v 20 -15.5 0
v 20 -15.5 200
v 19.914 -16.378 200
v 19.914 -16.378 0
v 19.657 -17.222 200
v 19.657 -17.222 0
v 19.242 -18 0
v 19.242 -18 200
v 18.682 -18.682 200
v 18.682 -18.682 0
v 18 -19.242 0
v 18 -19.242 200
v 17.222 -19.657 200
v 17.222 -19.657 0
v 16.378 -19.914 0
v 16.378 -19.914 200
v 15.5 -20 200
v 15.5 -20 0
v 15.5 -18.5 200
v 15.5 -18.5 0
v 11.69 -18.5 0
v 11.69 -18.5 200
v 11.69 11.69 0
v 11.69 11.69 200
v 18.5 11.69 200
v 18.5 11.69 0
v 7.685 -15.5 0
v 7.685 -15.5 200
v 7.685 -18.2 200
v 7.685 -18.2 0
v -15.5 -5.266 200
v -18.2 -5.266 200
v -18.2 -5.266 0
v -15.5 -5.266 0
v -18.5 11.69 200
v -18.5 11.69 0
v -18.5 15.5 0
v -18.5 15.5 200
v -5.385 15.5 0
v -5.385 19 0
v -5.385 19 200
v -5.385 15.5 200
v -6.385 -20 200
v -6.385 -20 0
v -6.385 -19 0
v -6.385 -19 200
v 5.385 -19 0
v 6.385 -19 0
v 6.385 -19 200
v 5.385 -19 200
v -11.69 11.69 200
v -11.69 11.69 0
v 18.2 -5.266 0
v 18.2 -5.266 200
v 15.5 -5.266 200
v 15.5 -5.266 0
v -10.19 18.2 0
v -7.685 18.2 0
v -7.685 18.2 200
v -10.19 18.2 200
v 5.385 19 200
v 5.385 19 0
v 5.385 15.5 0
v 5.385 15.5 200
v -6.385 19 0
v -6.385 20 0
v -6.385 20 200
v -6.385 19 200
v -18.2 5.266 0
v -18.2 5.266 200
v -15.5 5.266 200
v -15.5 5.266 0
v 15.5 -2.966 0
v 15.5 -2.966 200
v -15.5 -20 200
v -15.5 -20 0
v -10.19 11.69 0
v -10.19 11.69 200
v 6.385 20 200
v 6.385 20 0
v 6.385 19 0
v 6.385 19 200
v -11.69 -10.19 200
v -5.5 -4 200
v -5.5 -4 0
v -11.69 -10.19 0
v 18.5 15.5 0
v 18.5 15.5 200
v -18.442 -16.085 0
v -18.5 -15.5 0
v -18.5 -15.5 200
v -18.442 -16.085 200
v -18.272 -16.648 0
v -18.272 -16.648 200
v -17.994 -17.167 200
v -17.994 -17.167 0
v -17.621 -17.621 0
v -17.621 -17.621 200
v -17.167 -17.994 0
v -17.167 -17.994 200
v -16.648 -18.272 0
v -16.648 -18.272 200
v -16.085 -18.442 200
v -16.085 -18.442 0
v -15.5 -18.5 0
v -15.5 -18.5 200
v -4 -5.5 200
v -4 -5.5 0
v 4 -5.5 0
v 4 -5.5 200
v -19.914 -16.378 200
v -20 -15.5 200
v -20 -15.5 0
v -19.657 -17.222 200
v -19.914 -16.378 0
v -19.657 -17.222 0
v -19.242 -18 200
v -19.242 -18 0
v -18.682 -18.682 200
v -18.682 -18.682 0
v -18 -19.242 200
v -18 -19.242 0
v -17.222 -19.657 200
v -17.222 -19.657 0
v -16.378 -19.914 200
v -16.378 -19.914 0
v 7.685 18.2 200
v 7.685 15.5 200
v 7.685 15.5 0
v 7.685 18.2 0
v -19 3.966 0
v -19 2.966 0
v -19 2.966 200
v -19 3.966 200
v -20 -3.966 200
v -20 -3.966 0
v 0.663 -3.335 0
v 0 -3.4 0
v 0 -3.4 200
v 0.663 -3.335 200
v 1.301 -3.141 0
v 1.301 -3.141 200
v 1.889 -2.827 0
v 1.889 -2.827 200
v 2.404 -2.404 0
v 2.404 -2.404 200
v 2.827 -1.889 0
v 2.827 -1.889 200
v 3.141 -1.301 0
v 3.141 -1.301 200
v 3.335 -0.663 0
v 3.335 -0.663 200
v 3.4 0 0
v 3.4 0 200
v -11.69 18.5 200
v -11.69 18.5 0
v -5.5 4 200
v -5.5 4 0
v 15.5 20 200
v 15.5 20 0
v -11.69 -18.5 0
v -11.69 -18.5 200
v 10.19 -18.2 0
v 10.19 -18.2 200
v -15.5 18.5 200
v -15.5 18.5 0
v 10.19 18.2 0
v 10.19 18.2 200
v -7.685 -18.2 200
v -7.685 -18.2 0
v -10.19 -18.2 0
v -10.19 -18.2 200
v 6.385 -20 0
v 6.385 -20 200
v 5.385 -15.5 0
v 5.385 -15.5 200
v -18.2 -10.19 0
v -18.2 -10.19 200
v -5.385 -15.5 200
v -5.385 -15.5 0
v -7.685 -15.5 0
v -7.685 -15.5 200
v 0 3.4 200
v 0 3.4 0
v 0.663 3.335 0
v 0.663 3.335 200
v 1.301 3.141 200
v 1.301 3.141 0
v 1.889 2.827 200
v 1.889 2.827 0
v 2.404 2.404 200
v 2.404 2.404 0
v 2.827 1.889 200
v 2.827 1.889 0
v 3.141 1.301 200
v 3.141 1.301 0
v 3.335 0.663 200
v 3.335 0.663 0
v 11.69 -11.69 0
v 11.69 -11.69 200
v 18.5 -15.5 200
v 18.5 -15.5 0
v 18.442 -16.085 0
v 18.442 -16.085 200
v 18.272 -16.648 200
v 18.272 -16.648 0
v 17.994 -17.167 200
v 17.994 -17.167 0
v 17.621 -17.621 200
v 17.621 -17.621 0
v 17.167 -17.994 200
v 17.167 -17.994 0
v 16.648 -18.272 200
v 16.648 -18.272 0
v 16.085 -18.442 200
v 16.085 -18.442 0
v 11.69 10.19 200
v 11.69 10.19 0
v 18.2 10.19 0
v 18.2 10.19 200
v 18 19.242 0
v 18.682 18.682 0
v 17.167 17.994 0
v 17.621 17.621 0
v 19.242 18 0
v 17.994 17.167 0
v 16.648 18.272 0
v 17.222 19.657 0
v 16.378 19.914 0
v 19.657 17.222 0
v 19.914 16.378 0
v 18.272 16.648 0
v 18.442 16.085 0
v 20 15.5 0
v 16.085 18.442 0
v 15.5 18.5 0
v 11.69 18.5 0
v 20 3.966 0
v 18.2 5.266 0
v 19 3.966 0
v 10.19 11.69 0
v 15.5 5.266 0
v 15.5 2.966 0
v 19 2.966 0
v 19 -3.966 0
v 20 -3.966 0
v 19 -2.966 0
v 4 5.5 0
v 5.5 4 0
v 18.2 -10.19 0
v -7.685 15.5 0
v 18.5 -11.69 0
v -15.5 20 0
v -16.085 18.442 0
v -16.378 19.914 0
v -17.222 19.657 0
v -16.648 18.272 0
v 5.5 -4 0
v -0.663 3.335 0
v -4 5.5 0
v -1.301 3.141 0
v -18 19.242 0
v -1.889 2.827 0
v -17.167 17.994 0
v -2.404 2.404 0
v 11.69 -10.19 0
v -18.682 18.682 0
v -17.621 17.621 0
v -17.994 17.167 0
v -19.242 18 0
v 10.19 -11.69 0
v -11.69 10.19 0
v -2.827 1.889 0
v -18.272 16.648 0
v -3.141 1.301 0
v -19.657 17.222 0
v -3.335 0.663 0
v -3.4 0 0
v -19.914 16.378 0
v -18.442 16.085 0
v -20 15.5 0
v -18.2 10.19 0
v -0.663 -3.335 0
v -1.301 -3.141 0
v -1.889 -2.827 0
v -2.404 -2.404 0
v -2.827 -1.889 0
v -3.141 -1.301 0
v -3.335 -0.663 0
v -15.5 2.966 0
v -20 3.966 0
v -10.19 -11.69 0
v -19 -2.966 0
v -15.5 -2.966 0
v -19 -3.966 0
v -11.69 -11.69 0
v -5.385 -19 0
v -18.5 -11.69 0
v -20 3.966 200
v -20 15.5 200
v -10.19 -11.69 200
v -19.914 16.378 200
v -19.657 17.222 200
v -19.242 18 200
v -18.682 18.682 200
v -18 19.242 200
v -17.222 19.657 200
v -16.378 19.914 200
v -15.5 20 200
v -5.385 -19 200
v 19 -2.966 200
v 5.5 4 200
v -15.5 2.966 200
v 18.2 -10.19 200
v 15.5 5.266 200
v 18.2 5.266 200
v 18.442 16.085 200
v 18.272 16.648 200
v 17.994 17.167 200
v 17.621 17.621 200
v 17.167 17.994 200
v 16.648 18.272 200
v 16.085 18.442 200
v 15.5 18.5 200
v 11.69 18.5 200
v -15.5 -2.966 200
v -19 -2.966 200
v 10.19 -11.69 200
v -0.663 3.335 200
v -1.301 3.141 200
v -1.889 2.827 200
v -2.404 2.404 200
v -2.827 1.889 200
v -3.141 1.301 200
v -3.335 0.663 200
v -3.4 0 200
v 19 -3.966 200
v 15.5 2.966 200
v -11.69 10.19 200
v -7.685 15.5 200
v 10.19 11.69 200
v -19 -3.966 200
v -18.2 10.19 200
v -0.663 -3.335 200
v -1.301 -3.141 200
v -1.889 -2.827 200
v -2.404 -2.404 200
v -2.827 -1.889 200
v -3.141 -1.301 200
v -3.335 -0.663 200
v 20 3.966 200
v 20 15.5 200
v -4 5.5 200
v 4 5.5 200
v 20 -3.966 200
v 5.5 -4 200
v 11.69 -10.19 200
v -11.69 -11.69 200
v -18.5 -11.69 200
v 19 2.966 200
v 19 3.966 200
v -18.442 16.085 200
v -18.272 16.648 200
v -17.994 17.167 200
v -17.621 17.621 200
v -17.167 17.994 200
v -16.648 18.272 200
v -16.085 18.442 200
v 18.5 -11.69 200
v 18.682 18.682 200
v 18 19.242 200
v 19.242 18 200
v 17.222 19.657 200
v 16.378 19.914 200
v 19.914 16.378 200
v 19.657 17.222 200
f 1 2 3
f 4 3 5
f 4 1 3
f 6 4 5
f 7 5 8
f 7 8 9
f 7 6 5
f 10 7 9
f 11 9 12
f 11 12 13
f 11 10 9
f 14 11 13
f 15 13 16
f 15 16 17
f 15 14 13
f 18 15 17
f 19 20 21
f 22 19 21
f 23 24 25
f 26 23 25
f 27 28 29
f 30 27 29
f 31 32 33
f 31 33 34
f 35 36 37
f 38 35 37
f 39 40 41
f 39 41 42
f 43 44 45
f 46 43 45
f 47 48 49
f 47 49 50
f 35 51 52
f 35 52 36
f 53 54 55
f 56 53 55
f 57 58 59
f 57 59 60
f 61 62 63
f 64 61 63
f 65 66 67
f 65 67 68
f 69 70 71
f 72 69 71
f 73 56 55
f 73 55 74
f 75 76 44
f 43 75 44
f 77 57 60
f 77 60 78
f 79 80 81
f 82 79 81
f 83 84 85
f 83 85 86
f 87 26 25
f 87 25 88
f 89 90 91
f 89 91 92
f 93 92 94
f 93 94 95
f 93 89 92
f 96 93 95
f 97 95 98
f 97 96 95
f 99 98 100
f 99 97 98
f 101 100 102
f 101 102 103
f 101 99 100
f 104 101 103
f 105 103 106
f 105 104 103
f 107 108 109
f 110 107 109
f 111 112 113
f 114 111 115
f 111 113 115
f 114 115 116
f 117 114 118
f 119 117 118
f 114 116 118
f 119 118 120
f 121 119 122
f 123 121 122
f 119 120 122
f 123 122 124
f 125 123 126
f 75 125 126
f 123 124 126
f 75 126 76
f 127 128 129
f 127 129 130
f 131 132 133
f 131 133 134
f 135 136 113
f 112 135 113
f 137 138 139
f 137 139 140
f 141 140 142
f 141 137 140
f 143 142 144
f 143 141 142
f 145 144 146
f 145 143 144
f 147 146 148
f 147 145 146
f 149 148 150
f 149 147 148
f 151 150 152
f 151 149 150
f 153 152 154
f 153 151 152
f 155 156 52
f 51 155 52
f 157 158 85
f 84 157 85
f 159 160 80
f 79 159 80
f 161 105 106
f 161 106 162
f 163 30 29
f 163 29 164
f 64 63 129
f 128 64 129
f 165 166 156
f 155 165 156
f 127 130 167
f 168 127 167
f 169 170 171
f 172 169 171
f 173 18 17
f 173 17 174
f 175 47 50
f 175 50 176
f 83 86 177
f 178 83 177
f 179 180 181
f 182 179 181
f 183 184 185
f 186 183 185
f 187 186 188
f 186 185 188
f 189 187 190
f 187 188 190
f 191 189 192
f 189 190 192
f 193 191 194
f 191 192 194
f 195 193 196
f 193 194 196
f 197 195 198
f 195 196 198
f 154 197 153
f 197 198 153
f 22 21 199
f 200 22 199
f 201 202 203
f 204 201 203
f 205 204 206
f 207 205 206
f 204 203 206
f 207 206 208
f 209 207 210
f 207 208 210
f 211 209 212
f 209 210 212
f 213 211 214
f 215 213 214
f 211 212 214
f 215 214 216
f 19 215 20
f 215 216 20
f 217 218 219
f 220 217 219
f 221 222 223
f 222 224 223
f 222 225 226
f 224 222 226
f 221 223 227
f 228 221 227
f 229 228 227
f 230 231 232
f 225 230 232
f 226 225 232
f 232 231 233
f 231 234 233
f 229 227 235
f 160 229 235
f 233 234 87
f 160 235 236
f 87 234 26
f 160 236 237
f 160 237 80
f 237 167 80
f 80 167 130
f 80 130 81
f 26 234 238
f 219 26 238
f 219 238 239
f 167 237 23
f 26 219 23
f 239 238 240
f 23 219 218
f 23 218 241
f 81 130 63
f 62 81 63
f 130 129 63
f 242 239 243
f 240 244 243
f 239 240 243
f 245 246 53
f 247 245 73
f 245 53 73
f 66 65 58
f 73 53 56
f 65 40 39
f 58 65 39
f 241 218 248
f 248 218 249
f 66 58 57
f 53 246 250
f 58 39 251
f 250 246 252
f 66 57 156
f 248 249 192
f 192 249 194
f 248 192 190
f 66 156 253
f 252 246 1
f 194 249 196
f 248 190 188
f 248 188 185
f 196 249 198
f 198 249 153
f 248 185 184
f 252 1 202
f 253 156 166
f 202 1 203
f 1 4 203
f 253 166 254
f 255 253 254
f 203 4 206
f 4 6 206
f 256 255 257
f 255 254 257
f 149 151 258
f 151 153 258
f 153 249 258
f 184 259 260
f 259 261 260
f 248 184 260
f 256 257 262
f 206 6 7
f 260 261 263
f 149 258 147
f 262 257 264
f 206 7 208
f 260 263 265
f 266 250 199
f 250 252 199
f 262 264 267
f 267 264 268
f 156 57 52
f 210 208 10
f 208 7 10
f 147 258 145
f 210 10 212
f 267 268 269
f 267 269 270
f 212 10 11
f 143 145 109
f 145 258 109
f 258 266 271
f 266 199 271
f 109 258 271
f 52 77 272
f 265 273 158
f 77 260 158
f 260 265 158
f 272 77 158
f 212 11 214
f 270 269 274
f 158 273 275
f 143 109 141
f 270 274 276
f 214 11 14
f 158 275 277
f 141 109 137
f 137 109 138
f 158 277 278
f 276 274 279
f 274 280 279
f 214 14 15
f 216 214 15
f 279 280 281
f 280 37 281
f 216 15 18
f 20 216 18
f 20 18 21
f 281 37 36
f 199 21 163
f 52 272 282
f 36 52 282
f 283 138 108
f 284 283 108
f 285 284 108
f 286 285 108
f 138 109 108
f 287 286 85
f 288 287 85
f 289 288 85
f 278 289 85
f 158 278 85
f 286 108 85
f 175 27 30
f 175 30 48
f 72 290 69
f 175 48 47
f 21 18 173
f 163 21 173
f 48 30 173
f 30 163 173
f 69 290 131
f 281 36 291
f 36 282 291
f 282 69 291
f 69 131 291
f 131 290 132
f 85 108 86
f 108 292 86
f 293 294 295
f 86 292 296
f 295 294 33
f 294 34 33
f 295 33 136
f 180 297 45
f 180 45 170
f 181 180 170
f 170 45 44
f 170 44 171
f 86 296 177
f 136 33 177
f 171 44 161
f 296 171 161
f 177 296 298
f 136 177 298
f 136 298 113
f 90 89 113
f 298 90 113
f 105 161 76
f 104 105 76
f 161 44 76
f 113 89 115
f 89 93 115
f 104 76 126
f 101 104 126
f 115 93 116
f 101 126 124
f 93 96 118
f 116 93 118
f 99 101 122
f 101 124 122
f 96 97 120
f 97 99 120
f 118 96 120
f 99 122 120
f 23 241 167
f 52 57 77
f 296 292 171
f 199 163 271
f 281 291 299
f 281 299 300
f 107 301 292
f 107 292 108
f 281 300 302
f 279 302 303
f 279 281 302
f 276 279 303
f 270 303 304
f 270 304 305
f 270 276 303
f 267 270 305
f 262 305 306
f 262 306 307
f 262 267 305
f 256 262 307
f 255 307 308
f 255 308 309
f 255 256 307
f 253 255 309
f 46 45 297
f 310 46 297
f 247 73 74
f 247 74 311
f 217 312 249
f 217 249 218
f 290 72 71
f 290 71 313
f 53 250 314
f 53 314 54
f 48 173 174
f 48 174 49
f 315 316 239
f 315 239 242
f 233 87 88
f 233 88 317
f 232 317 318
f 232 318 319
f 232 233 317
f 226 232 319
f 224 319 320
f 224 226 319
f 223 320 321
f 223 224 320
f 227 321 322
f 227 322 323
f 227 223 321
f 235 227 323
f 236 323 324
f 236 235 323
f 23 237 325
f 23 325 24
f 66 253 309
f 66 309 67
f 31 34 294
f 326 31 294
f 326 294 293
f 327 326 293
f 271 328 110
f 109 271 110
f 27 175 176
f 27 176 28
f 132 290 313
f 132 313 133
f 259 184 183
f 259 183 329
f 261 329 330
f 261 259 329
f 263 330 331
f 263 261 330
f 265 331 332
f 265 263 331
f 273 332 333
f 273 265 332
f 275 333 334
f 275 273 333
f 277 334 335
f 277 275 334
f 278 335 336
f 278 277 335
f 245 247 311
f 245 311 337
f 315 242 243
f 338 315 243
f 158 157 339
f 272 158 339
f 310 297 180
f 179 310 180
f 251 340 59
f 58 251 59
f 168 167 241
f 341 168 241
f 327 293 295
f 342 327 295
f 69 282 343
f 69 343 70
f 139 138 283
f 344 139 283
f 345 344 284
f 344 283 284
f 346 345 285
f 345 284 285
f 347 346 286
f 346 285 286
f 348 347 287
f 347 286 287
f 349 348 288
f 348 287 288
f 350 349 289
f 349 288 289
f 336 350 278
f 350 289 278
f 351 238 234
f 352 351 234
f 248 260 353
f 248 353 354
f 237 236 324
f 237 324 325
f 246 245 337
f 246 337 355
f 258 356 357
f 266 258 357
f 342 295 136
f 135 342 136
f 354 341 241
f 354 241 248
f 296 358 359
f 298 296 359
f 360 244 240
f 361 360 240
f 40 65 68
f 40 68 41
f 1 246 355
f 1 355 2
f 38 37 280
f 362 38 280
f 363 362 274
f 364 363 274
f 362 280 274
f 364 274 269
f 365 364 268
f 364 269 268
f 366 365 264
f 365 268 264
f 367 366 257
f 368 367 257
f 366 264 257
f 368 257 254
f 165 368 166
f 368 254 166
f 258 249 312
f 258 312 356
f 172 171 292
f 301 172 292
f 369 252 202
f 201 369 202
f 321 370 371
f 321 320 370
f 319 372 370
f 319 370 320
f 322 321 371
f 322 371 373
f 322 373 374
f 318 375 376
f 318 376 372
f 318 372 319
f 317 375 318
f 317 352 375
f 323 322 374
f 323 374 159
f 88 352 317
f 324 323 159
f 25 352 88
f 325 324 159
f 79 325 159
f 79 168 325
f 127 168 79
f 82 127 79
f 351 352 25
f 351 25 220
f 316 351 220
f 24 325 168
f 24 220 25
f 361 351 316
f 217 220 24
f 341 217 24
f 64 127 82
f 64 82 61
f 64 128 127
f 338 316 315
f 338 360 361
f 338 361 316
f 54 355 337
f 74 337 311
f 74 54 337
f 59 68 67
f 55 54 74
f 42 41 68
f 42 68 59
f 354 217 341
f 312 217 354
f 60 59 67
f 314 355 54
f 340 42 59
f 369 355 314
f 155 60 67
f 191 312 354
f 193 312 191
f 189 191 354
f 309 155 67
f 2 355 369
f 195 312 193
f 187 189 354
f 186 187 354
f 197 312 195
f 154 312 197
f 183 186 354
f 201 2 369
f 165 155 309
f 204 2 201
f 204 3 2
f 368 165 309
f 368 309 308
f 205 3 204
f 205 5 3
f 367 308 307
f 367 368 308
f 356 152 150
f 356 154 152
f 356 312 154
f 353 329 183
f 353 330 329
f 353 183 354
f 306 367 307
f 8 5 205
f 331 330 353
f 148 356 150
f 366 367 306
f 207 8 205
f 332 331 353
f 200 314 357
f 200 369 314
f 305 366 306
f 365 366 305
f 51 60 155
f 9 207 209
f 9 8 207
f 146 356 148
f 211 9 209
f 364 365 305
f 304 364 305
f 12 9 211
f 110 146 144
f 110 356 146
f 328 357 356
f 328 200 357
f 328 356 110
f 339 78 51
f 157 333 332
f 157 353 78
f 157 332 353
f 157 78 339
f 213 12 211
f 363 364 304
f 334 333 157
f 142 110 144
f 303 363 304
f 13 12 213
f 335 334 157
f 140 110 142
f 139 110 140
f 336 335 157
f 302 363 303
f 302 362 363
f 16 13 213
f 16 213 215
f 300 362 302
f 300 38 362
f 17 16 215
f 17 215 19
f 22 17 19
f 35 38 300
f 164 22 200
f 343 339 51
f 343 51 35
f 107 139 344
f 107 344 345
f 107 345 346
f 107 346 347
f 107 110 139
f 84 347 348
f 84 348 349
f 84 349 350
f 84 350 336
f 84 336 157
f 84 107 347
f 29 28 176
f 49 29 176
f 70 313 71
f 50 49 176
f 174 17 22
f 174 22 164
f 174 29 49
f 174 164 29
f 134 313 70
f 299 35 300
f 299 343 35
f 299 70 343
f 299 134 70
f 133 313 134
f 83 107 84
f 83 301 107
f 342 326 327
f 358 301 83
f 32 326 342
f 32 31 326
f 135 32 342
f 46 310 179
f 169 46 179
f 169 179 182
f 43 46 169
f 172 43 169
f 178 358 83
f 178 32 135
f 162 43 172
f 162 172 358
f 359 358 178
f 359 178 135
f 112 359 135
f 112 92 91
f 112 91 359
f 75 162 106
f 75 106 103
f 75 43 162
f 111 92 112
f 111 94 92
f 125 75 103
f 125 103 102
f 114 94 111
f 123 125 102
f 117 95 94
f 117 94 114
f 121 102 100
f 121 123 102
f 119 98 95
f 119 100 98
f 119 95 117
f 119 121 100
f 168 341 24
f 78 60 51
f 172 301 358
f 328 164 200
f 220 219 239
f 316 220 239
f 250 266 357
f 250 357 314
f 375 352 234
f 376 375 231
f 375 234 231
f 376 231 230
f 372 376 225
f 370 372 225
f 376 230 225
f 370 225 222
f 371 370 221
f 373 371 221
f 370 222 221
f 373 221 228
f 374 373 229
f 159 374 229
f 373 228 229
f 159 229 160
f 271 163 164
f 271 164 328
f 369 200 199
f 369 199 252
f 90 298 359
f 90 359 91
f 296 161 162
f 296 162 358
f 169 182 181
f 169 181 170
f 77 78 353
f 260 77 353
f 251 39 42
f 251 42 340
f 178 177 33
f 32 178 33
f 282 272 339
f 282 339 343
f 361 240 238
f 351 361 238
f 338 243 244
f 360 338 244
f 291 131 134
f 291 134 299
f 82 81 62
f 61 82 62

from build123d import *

# Parameters (mm, degrees)
BOSS_EXTRUDE1_DEPTH  = 200
MIRROR3_COPY_1_DEPTH = 200
MIRROR3_COPY_2_DEPTH = 200


with BuildPart() as part:
    # Sketch1 → Boss-Extrude1 (new body)
    with BuildSketch(Plane.XY):
        with BuildLine():
            Line((3.4, 0), (5.5, 0))
            Line((5.5, 0), (5.5, 4))
            Line((5.5, 4), (11.69, 10.19))
            Line((11.69, 10.19), (18.2, 10.19))
            Line((18.2, 10.19), (18.2, 5.265595036))
            Line((18.2, 5.265595036), (15.5, 5.265595036))
            Line((15.5, 5.265595036), (15.5, 2.965595036))
            Line((15.5, 2.965595036), (19, 2.965595036))
            Line((19, 2.965595036), (19, 3.965595036))
            Line((19, 3.965595036), (20, 3.965595036))
            Line((20, 3.965595036), (20, 15.5))
            ThreePointArc((20, 15.5), (18.681980515, 18.681980515), (15.5, 20))
            Line((15.5, 20), (6.385304712, 20))
            Line((6.385304712, 20), (6.385304712, 19))
            Line((6.385304712, 19), (5.385304712, 19))
            Line((5.385304712, 19), (5.385304712, 15.5))
            Line((5.385304712, 15.5), (7.685304712, 15.5))
            Line((7.685304712, 15.5), (7.685304712, 18.2))
            Line((7.685304712, 18.2), (10.19, 18.2))
            Line((10.19, 18.2), (10.19, 11.69))
            Line((10.19, 11.69), (4, 5.5))
            Line((4, 5.5), (0, 5.5))
            Line((0, 5.5), (0, 3.4))
            ThreePointArc((0, 3.4), (2.404163056, 2.404163056), (3.4, 0))
        make_face()
        with BuildLine():
            Line((18.5, 11.69), (18.5, 15.5))
            ThreePointArc((18.5, 15.5), (17.621320344, 17.621320344), (15.5, 18.5))
            Line((15.5, 18.5), (11.69, 18.5))
            Line((11.69, 18.5), (11.69, 11.69))
            Line((11.69, 11.69), (18.5, 11.69))
        make_face(mode=Mode.SUBTRACT)
    boss_extrude1 = extrude(amount=BOSS_EXTRUDE1_DEPTH)

    # Mirror1: Boss-Extrude1 across plane
    add(boss_extrude1.mirror(Plane.ZX))

    # Mirror2: Boss-Extrude1 across plane
    add(boss_extrude1.mirror(Plane(origin=(0, 0, 0), x_dir=(0, 0, 1), z_dir=(1, 0, 0))))

    # Mirror3 copy 1 sketch → Mirror3 copy 1 (add)
    with BuildSketch(Plane(origin=(0, 0, 0), x_dir=(-1, 0, 0), z_dir=(0, 0, 1))):
        with BuildLine():
            Line((3.4, 0), (5.5, 0))
            Line((5.5, 0), (5.5, 4))
            Line((5.5, 4), (11.69, 10.19))
            Line((11.69, 10.19), (18.2, 10.19))
            Line((18.2, 10.19), (18.2, 5.265595036))
            Line((18.2, 5.265595036), (15.5, 5.265595036))
            Line((15.5, 5.265595036), (15.5, 2.965595036))
            Line((15.5, 2.965595036), (19, 2.965595036))
            Line((19, 2.965595036), (19, 3.965595036))
            Line((19, 3.965595036), (20, 3.965595036))
            Line((20, 3.965595036), (20, 15.5))
            ThreePointArc((20, 15.5), (18.681980515, 18.681980515), (15.5, 20))
            Line((15.5, 20), (6.385304712, 20))
            Line((6.385304712, 20), (6.385304712, 19))
            Line((6.385304712, 19), (5.385304712, 19))
            Line((5.385304712, 19), (5.385304712, 15.5))
            Line((5.385304712, 15.5), (7.685304712, 15.5))
            Line((7.685304712, 15.5), (7.685304712, 18.2))
            Line((7.685304712, 18.2), (10.19, 18.2))
            Line((10.19, 18.2), (10.19, 11.69))
            Line((10.19, 11.69), (4, 5.5))
            Line((4, 5.5), (0, 5.5))
            Line((0, 5.5), (0, 3.4))
            ThreePointArc((0, 3.4), (2.404163056, 2.404163056), (3.4, 0))
        make_face()
        with BuildLine():
            Line((18.5, 11.69), (18.5, 15.5))
            ThreePointArc((18.5, 15.5), (17.621320344, 17.621320344), (15.5, 18.5))
            Line((15.5, 18.5), (11.69, 18.5))
            Line((11.69, 18.5), (11.69, 11.69))
            Line((11.69, 11.69), (18.5, 11.69))
        make_face(mode=Mode.SUBTRACT)
    extrude(amount=MIRROR3_COPY_1_DEPTH)

    # Mirror3 copy 2 sketch → Mirror3 copy 2 (add)
    with BuildSketch(Plane.XY):
        with BuildLine():
            Line((3.4, 0), (5.5, 0))
            Line((5.5, 0), (5.5, -4))
            Line((5.5, -4), (11.69, -10.19))
            Line((11.69, -10.19), (18.2, -10.19))
            Line((18.2, -10.19), (18.2, -5.265595036))
            Line((18.2, -5.265595036), (15.5, -5.265595036))
            Line((15.5, -5.265595036), (15.5, -2.965595036))
            Line((15.5, -2.965595036), (19, -2.965595036))
            Line((19, -2.965595036), (19, -3.965595036))
            Line((19, -3.965595036), (20, -3.965595036))
            Line((20, -3.965595036), (20, -15.5))
            ThreePointArc((20, -15.5), (18.681980515, -18.681980515), (15.5, -20))
            Line((15.5, -20), (6.385304712, -20))
            Line((6.385304712, -20), (6.385304712, -19))
            Line((6.385304712, -19), (5.385304712, -19))
            Line((5.385304712, -19), (5.385304712, -15.5))
            Line((5.385304712, -15.5), (7.685304712, -15.5))
            Line((7.685304712, -15.5), (7.685304712, -18.2))
            Line((7.685304712, -18.2), (10.19, -18.2))
            Line((10.19, -18.2), (10.19, -11.69))
            Line((10.19, -11.69), (4, -5.5))
            Line((4, -5.5), (0, -5.5))
            Line((0, -5.5), (0, -3.4))
            ThreePointArc((0, -3.4), (2.404163056, -2.404163056), (3.4, 0))
        make_face()
        with BuildLine():
            Line((18.5, -11.69), (18.5, -15.5))
            ThreePointArc((18.5, -15.5), (17.621320344, -17.621320344), (15.5, -18.5))
            Line((15.5, -18.5), (11.69, -18.5))
            Line((11.69, -18.5), (11.69, -11.69))
            Line((11.69, -11.69), (18.5, -11.69))
        make_face(mode=Mode.SUBTRACT)
    extrude(amount=MIRROR3_COPY_2_DEPTH)


solid = part.part
